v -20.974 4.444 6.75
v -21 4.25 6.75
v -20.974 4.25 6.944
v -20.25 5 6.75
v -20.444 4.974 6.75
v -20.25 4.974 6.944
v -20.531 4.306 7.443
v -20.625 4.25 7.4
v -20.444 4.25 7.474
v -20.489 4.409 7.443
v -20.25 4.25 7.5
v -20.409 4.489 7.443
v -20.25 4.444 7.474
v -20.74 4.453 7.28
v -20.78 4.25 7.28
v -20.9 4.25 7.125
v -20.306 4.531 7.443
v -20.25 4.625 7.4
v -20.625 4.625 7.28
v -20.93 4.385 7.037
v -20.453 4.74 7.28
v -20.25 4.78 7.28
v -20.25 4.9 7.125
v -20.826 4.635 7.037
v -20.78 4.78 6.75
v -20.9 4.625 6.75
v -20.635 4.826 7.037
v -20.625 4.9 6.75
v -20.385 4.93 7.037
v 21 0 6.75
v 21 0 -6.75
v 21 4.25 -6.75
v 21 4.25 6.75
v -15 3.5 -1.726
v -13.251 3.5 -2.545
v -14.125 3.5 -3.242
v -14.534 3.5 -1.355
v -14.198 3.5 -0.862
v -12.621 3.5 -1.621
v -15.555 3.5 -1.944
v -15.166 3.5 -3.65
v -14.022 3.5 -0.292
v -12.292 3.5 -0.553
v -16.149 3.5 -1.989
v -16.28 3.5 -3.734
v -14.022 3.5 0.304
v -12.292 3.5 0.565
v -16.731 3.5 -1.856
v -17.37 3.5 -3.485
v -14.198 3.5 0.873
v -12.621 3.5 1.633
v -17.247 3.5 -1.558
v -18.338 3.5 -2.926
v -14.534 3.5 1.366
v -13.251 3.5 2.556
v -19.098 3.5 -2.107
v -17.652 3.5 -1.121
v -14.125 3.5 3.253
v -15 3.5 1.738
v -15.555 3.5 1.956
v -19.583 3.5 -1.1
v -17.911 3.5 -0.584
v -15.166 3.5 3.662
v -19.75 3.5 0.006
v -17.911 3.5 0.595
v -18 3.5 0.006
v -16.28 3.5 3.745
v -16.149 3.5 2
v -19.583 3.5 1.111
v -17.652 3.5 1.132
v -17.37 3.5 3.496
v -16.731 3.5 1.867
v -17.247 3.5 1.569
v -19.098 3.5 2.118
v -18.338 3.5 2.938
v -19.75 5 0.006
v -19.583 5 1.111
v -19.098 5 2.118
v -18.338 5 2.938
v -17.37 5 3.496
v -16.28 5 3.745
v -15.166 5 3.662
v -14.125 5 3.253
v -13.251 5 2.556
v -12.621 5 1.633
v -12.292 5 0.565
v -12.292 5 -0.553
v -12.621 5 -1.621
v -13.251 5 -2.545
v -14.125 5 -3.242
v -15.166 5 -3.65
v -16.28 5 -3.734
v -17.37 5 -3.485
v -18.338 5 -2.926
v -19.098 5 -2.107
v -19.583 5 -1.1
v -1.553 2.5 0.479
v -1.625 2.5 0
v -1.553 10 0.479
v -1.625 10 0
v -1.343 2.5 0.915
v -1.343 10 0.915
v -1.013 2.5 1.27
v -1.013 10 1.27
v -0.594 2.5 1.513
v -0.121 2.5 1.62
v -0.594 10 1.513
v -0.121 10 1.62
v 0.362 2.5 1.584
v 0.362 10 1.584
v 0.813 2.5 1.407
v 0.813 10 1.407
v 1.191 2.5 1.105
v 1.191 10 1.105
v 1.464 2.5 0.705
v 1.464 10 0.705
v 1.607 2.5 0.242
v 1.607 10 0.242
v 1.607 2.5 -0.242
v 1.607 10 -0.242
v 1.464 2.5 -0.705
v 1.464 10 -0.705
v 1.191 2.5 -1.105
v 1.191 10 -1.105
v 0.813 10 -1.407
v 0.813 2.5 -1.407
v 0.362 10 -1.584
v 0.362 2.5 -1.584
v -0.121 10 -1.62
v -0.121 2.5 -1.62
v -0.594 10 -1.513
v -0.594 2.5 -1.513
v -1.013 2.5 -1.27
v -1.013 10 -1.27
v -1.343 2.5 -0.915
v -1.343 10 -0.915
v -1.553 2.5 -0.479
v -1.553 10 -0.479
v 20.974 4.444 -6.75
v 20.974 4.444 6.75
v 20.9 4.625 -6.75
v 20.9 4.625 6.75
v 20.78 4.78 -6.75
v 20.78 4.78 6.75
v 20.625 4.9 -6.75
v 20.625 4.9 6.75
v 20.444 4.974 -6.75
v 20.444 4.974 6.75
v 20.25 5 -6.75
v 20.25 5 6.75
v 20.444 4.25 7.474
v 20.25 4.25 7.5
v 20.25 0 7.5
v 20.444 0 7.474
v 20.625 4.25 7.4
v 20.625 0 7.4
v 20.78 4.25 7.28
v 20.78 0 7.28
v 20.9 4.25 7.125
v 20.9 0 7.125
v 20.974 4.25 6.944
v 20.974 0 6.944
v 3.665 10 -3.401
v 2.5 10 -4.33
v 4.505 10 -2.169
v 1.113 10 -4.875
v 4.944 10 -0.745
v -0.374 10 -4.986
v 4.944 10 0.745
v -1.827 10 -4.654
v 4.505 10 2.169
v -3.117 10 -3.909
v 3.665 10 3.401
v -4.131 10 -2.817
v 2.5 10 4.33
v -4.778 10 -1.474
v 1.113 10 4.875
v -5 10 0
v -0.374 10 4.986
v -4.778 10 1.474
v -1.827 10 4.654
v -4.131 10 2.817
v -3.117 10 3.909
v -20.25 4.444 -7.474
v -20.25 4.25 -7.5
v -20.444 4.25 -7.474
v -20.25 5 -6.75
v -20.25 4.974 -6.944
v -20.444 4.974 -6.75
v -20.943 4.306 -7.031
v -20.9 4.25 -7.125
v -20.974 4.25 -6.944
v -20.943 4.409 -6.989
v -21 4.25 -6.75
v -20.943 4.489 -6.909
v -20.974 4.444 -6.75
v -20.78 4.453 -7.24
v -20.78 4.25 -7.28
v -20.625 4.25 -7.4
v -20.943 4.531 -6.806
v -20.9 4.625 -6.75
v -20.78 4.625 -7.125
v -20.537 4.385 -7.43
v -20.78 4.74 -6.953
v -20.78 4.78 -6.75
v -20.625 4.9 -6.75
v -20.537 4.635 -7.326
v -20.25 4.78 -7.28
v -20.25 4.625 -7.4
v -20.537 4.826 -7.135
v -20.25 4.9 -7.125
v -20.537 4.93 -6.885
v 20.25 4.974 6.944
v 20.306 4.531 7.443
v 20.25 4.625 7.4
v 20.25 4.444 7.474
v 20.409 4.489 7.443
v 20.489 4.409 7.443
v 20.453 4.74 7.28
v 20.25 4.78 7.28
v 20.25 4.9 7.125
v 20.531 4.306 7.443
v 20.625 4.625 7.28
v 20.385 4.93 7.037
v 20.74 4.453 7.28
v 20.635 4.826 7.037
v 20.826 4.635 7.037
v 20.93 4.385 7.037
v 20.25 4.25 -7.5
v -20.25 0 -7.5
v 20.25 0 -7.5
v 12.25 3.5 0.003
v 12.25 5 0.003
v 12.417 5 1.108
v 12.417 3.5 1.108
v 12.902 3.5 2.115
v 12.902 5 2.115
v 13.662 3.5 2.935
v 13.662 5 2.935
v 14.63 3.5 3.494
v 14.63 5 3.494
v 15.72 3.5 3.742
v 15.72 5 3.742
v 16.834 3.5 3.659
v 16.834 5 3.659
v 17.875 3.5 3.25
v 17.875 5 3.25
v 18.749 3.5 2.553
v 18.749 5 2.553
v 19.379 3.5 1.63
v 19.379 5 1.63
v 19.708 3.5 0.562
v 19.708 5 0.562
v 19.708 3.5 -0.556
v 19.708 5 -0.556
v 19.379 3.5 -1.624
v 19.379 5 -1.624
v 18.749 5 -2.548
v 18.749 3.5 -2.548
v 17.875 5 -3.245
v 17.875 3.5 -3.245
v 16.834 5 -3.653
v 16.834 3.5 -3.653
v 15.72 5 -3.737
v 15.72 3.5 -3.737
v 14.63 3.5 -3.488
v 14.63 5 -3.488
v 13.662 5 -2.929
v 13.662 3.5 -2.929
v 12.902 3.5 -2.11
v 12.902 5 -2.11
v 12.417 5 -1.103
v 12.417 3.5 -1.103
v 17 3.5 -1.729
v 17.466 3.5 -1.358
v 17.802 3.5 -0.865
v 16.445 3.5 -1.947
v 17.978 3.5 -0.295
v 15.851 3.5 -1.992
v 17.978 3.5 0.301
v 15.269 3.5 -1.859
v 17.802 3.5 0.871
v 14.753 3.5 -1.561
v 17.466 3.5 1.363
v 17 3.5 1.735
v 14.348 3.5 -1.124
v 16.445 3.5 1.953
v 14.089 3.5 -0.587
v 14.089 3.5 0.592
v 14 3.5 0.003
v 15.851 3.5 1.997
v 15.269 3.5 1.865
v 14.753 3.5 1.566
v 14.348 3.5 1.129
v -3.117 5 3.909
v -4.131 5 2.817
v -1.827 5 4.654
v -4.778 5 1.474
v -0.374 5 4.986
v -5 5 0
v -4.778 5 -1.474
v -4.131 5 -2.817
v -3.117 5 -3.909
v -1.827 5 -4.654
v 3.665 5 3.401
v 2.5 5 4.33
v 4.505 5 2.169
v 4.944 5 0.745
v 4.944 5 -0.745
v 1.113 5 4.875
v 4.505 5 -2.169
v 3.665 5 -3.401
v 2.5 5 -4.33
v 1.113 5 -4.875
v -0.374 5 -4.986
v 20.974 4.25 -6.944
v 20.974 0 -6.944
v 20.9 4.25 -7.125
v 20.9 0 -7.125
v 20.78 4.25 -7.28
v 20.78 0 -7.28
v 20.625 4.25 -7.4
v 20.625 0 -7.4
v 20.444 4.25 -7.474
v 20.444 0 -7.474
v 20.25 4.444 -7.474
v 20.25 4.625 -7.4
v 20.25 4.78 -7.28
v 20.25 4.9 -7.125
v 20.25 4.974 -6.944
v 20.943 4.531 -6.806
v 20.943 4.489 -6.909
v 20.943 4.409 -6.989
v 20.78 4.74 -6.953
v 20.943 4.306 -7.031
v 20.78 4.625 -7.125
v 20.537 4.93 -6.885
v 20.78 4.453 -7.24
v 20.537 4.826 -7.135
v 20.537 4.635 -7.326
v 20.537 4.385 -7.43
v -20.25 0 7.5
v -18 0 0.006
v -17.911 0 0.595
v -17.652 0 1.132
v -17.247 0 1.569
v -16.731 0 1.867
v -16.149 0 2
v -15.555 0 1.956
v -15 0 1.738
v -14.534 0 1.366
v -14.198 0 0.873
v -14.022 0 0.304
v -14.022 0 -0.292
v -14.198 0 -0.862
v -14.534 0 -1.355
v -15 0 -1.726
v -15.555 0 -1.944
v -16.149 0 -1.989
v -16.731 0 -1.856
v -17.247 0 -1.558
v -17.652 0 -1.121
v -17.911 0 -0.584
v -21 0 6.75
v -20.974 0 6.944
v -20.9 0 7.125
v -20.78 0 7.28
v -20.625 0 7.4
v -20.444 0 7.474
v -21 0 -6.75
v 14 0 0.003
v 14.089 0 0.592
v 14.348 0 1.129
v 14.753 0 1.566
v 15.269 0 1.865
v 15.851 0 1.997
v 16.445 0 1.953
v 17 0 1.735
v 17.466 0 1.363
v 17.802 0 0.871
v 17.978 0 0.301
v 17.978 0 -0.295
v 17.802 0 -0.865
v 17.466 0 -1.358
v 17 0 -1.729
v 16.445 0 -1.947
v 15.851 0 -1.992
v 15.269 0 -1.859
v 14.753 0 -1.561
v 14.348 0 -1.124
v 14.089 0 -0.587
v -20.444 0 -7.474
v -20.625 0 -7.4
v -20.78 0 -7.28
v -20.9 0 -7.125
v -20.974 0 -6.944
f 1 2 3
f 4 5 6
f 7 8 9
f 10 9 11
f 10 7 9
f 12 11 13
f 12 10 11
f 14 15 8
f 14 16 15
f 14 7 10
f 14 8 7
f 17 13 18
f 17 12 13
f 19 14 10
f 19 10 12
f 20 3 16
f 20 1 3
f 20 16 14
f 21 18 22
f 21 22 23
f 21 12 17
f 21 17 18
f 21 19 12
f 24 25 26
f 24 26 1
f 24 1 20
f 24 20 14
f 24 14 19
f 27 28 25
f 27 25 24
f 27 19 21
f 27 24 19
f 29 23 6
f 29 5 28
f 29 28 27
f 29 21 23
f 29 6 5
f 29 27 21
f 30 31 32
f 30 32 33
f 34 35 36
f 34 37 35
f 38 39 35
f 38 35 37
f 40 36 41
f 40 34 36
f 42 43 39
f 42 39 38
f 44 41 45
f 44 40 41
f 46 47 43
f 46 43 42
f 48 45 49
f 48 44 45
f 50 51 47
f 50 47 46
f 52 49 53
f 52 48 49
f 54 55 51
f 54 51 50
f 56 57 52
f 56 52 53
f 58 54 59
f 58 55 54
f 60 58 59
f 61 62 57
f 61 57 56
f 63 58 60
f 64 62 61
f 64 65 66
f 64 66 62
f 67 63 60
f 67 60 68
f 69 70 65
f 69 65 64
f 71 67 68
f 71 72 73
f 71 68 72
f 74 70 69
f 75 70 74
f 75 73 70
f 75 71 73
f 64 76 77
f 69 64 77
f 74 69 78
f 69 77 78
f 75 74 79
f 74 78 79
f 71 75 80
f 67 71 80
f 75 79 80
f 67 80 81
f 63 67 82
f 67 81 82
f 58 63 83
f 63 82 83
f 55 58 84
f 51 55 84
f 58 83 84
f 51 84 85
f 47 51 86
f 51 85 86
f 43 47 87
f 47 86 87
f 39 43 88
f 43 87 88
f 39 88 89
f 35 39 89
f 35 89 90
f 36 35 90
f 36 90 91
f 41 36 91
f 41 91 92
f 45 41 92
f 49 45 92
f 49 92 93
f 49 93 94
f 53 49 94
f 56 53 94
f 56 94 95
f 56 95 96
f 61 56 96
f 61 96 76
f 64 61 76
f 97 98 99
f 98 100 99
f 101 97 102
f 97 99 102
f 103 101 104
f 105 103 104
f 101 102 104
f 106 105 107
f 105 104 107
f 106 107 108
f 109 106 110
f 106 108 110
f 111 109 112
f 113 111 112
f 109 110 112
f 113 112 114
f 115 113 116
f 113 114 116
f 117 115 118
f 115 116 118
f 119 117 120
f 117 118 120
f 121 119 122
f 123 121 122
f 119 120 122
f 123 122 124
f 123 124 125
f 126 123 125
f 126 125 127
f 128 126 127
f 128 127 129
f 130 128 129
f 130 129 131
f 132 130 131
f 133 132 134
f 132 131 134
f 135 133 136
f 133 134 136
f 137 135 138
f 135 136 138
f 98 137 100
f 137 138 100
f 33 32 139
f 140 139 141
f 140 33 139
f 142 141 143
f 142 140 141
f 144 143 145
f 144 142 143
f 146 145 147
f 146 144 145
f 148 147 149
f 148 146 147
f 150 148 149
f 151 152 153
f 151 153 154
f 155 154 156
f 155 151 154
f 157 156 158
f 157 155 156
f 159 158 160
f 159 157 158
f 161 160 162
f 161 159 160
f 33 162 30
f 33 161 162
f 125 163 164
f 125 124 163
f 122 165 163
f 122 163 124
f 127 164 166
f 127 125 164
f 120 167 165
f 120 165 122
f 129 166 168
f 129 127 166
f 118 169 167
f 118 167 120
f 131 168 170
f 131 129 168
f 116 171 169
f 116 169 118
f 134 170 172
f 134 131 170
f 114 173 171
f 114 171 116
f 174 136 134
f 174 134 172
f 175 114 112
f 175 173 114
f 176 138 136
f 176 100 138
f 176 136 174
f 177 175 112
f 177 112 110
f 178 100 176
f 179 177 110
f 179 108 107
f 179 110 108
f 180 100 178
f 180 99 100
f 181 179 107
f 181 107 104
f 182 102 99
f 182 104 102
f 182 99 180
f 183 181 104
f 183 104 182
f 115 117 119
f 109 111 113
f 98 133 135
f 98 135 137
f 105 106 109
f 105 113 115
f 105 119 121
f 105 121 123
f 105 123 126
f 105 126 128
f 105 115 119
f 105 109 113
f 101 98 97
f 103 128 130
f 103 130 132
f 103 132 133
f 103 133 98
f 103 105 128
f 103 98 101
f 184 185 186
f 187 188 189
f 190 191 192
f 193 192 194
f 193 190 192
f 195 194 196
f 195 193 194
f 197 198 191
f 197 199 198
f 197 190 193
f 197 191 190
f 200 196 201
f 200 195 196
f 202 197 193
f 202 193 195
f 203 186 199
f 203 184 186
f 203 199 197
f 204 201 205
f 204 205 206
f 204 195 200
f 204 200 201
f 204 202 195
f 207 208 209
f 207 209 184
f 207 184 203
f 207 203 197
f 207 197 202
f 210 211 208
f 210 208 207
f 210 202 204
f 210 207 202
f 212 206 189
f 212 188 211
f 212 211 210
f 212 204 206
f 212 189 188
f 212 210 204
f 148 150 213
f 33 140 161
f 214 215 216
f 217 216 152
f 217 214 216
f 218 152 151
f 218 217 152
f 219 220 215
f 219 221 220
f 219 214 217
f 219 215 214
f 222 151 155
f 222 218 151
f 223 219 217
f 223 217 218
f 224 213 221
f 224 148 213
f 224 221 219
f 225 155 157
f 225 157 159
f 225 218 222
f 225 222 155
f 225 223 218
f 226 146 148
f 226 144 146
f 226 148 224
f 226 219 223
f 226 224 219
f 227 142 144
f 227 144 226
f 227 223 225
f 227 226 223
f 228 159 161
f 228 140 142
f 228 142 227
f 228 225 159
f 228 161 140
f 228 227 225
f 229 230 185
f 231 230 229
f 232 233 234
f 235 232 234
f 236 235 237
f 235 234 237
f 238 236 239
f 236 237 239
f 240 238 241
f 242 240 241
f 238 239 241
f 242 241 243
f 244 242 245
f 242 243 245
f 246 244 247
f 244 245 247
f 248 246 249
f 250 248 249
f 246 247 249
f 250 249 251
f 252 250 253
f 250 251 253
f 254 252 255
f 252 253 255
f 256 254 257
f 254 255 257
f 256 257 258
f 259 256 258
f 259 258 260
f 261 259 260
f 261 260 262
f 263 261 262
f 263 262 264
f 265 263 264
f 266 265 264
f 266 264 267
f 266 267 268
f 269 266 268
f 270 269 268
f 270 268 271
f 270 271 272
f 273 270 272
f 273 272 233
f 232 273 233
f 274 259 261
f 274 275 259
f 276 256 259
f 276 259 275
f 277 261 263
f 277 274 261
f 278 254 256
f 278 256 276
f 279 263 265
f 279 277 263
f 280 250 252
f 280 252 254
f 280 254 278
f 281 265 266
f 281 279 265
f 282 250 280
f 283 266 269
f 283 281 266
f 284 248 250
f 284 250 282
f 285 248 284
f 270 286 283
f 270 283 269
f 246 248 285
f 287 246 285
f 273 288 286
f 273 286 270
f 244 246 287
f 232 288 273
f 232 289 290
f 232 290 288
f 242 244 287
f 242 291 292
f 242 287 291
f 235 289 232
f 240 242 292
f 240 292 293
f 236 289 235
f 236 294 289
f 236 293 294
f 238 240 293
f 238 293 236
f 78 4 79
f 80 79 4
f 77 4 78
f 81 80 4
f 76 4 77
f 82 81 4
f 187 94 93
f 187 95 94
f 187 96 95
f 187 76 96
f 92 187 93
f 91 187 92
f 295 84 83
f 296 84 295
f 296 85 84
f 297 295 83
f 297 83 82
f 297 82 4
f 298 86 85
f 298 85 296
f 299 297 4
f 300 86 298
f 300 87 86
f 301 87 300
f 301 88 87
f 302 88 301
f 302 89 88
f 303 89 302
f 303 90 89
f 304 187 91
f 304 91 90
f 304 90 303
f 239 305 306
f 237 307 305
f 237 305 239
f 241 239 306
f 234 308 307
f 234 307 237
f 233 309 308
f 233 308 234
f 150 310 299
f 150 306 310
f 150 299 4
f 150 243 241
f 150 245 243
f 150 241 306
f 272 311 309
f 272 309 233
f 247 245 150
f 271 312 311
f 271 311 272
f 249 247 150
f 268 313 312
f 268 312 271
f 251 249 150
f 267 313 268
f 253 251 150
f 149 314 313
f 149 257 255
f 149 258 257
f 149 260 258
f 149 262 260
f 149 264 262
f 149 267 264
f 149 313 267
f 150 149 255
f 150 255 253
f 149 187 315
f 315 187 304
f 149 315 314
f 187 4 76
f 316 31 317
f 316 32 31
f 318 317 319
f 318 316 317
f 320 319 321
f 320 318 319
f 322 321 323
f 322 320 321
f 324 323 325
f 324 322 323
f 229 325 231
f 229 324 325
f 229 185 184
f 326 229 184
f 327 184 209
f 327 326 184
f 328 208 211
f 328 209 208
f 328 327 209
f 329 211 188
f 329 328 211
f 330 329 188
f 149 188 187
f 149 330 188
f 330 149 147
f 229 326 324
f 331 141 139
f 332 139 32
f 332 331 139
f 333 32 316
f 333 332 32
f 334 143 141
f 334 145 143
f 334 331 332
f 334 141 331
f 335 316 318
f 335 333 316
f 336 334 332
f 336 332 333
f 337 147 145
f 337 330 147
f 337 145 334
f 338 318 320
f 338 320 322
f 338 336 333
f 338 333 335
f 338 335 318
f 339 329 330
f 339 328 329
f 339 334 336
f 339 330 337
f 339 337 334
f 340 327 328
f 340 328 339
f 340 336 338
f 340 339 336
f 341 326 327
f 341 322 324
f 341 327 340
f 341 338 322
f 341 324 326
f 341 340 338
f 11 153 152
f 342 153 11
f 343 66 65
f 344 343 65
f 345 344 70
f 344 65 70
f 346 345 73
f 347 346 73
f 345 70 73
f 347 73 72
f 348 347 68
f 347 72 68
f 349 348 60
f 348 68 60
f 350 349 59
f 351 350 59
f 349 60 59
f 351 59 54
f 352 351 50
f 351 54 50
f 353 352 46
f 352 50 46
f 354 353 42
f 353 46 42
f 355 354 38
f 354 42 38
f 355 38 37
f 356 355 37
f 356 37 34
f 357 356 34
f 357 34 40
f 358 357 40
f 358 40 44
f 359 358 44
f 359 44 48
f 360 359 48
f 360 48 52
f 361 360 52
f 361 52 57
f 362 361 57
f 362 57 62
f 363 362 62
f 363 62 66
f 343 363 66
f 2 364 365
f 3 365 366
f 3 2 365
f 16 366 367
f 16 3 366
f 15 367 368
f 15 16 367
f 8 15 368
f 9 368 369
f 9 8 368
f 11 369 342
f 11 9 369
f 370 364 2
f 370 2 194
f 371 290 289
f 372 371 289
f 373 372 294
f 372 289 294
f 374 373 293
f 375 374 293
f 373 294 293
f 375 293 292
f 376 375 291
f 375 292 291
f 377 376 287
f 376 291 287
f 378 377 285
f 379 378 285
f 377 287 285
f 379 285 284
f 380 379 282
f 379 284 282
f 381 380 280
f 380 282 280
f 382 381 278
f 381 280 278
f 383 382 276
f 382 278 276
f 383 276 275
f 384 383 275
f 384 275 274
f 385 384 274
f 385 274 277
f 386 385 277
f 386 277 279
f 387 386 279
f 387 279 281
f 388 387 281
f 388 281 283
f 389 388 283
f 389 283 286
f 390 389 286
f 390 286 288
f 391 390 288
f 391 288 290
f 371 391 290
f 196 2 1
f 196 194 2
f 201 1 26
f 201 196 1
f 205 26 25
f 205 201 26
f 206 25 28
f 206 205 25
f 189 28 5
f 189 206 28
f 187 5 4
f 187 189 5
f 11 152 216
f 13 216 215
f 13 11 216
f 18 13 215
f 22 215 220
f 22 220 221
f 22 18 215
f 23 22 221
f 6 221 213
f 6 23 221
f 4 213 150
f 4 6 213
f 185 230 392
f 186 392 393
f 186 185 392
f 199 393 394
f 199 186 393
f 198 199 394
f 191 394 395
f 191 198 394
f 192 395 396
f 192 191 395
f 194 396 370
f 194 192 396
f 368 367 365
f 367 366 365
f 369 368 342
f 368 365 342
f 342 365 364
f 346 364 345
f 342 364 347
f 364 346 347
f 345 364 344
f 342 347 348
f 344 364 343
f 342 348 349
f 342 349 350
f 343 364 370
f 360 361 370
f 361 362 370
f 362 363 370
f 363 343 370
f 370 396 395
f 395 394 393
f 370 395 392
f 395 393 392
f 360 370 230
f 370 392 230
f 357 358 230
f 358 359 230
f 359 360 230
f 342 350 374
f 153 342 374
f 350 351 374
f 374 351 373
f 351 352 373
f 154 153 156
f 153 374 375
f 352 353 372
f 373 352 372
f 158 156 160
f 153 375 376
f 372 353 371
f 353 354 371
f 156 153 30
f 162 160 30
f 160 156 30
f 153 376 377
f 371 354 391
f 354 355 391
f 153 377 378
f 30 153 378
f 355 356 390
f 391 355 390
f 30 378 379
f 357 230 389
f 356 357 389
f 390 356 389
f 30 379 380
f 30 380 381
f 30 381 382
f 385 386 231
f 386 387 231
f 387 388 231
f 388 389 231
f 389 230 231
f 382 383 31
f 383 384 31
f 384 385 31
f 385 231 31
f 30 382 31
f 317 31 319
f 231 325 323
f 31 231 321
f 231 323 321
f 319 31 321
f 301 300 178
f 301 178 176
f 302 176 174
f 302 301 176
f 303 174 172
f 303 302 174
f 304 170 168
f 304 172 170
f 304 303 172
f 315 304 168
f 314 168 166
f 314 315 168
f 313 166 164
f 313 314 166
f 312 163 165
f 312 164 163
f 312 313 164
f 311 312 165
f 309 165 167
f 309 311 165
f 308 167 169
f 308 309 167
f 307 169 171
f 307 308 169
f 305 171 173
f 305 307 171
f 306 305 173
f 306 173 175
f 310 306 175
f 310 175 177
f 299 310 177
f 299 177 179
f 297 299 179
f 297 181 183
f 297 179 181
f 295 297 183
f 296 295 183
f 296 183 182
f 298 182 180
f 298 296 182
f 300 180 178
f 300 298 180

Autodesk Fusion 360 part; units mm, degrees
sketch "Sketch1" plane through (0, 0, 0) normal (0, 1, 0) x (1, 0, 0)
  line L0 (21, -7.5) -> (-21, -7.5)
  line L1 (-21, -7.5) -> (-21, 7.5)
  line L2 (-21, 7.5) -> (21, 7.5)
  line L3 (21, 7.5) -> (21, -7.5)
  dimension "d1" = 42
  dimension "d2" = 15
  dimension "d3" = 7.5
  dimension "d4" = 21
extrude "Extrude1" add sketch "Sketch1" along normal blind 5
sketch "Sketch2" plane through (0, 5, 0) normal (0, 1, 0) x (-1, 0, 0)
  line L0 (-21, -7.5) -> (21, -7.5)
  line L1 (21, -7.5) -> (21, 7.5)
  line L2 (21, 7.5) -> (-21, 7.5)
  line L3 (-21, 7.5) -> (-21, -7.5)
  circle A0 centre (0, 0) radius 5
  dimension "d7" = 10
extrude "Extrude2" add sketch "Sketch2" along normal blind 5 contours A0
sketch "Sketch3" plane through (0, 10, 0) normal (0, 1, 0) x (-1, 0, 0)
  circle A0 centre (0, 0) radius 5
  circle A1 centre (0, 0) radius 1.625
  dimension "d10" = 3.25
extrude "Extrude6" cut sketch "Sketch3" against normal blind 7.5 contours A1
sketch "Sketch7" plane through (0, 5, 0) normal (0, 1, 0) x (-1, 0, 0)
  circle A0 centre (0, 0) radius 5
  line L0 (-21, -7.5) -> (21, -7.5)
  line L1 (21, -7.5) -> (21, 7.5)
  line L2 (21, 7.5) -> (-21, 7.5)
  line L3 (-21, 7.5) -> (-21, -7.5)
  circle A1 centre (16, 0.0057) radius 2
  circle A2 centre (-16, 0.0028) radius 2
  dimension "d23" = 32
  dimension "d24" = 16
  dimension "d25" = 4
  dimension "d26" = 4
extrude "Extrude7" cut sketch "Sketch7" against normal through all contours A1 | A2
fillet "Fillet1" radius 0.75 8 edges at (0, 5, -7.5) (-21, 5, 0) (21, 5, 0) (0, 5, 7.5) (-21, 2.5, 7.5) (21, 2.5, 7.5) (21, 2.5, -7.5) (-21, 2.5, -7.5)
sketch "Sketch8" plane through (0, 5, 0) normal (0, 1, 0) x (-1, 0, 0)
  circle A0 centre (16, 0.0057) radius 2
  circle A1 centre (-16, 0.0028) radius 2
  circle A2 centre (16, 0.0057) radius 3.75
  circle A3 centre (-16, 0.0028) radius 3.75
  dimension "d29" = 7.5
  dimension "d30" = 7.5
extrude "Extrude8" cut sketch "Sketch8" against normal blind 1.5
